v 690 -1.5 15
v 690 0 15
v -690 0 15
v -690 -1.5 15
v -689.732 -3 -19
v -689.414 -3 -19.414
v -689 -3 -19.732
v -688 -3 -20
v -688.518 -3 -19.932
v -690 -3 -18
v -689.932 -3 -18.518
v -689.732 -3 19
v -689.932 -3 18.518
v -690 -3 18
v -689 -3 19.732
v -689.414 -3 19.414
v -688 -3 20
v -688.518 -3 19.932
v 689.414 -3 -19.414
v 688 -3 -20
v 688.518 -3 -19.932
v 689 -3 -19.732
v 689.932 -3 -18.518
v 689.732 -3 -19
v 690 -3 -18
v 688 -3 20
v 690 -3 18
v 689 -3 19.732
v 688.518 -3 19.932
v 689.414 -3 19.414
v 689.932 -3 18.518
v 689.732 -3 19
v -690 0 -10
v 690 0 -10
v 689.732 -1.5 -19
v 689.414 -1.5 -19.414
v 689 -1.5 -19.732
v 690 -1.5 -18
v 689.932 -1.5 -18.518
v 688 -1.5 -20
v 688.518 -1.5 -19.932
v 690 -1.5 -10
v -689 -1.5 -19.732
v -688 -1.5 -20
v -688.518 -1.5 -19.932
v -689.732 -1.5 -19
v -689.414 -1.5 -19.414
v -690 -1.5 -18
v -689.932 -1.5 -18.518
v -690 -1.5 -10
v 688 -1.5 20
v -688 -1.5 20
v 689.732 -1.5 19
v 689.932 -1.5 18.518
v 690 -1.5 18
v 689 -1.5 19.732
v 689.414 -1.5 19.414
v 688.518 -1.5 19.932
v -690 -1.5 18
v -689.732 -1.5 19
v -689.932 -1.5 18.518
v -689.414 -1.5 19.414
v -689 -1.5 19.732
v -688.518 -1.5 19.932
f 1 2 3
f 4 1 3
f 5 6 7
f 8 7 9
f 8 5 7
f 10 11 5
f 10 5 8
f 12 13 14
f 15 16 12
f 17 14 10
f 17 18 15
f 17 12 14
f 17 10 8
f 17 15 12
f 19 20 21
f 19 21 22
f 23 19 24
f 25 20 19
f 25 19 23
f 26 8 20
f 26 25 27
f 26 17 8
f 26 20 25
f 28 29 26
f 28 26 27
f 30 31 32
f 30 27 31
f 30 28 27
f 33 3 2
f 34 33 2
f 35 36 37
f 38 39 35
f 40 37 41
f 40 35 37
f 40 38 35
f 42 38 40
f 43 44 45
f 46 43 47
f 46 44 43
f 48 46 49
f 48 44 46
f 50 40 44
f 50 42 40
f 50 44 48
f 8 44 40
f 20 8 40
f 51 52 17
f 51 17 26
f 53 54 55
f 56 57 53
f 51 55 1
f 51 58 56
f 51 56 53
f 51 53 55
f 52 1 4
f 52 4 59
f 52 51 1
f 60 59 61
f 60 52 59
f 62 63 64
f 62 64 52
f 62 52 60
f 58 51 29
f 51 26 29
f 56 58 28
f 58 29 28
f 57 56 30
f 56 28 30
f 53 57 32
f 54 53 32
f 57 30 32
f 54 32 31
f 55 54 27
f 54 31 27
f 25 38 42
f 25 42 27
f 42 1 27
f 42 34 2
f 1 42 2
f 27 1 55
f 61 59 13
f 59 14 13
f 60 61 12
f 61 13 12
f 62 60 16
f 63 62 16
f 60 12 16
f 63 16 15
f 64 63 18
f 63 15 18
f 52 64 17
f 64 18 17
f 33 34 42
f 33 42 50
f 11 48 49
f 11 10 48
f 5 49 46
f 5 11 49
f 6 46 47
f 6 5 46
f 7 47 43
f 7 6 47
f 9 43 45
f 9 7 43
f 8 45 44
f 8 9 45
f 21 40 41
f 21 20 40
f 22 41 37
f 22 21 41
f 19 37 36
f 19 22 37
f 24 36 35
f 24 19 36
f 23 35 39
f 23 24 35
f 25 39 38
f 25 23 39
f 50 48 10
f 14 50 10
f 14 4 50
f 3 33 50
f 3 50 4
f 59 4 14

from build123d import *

# Parameters (mm, degrees)
F0_W     = 1380
F0_H     = 40
F1_DEPTH = 3
F2_W     = 1380
F2_H     = 5
F2_H_2   = 10
F3_DEPTH = 1.5
F4_R     = 2


with BuildPart() as f1:
    # F0 (on Front) → F1 (new body)
    with BuildSketch(Plane.XZ):
        Rectangle(F0_W, F0_H)
    extrude(amount=F1_DEPTH)

    # F2 (on face) → F3 (cut)
    with BuildSketch(Plane(origin=(0, 0, 0), x_dir=(-1, 0, 0), z_dir=(0, 1, 0))):
        with Locations((0, 17.5)):
            Rectangle(F2_W, F2_H)
        with Locations((0, -15)):
            Rectangle(F2_W, F2_H_2)
    extrude(amount=-F3_DEPTH, mode=Mode.SUBTRACT)

    # F4
    f4_edges = [f1.edges().sort_by_distance(p)[0] for p in [
        (690, -2.25, 20),
        (690, -2.25, -20),
        (-690, -2.25, 20),
        (-690, -2.25, -20),
    ]]
    fillet(f4_edges, radius=F4_R)


solid = f1.part
